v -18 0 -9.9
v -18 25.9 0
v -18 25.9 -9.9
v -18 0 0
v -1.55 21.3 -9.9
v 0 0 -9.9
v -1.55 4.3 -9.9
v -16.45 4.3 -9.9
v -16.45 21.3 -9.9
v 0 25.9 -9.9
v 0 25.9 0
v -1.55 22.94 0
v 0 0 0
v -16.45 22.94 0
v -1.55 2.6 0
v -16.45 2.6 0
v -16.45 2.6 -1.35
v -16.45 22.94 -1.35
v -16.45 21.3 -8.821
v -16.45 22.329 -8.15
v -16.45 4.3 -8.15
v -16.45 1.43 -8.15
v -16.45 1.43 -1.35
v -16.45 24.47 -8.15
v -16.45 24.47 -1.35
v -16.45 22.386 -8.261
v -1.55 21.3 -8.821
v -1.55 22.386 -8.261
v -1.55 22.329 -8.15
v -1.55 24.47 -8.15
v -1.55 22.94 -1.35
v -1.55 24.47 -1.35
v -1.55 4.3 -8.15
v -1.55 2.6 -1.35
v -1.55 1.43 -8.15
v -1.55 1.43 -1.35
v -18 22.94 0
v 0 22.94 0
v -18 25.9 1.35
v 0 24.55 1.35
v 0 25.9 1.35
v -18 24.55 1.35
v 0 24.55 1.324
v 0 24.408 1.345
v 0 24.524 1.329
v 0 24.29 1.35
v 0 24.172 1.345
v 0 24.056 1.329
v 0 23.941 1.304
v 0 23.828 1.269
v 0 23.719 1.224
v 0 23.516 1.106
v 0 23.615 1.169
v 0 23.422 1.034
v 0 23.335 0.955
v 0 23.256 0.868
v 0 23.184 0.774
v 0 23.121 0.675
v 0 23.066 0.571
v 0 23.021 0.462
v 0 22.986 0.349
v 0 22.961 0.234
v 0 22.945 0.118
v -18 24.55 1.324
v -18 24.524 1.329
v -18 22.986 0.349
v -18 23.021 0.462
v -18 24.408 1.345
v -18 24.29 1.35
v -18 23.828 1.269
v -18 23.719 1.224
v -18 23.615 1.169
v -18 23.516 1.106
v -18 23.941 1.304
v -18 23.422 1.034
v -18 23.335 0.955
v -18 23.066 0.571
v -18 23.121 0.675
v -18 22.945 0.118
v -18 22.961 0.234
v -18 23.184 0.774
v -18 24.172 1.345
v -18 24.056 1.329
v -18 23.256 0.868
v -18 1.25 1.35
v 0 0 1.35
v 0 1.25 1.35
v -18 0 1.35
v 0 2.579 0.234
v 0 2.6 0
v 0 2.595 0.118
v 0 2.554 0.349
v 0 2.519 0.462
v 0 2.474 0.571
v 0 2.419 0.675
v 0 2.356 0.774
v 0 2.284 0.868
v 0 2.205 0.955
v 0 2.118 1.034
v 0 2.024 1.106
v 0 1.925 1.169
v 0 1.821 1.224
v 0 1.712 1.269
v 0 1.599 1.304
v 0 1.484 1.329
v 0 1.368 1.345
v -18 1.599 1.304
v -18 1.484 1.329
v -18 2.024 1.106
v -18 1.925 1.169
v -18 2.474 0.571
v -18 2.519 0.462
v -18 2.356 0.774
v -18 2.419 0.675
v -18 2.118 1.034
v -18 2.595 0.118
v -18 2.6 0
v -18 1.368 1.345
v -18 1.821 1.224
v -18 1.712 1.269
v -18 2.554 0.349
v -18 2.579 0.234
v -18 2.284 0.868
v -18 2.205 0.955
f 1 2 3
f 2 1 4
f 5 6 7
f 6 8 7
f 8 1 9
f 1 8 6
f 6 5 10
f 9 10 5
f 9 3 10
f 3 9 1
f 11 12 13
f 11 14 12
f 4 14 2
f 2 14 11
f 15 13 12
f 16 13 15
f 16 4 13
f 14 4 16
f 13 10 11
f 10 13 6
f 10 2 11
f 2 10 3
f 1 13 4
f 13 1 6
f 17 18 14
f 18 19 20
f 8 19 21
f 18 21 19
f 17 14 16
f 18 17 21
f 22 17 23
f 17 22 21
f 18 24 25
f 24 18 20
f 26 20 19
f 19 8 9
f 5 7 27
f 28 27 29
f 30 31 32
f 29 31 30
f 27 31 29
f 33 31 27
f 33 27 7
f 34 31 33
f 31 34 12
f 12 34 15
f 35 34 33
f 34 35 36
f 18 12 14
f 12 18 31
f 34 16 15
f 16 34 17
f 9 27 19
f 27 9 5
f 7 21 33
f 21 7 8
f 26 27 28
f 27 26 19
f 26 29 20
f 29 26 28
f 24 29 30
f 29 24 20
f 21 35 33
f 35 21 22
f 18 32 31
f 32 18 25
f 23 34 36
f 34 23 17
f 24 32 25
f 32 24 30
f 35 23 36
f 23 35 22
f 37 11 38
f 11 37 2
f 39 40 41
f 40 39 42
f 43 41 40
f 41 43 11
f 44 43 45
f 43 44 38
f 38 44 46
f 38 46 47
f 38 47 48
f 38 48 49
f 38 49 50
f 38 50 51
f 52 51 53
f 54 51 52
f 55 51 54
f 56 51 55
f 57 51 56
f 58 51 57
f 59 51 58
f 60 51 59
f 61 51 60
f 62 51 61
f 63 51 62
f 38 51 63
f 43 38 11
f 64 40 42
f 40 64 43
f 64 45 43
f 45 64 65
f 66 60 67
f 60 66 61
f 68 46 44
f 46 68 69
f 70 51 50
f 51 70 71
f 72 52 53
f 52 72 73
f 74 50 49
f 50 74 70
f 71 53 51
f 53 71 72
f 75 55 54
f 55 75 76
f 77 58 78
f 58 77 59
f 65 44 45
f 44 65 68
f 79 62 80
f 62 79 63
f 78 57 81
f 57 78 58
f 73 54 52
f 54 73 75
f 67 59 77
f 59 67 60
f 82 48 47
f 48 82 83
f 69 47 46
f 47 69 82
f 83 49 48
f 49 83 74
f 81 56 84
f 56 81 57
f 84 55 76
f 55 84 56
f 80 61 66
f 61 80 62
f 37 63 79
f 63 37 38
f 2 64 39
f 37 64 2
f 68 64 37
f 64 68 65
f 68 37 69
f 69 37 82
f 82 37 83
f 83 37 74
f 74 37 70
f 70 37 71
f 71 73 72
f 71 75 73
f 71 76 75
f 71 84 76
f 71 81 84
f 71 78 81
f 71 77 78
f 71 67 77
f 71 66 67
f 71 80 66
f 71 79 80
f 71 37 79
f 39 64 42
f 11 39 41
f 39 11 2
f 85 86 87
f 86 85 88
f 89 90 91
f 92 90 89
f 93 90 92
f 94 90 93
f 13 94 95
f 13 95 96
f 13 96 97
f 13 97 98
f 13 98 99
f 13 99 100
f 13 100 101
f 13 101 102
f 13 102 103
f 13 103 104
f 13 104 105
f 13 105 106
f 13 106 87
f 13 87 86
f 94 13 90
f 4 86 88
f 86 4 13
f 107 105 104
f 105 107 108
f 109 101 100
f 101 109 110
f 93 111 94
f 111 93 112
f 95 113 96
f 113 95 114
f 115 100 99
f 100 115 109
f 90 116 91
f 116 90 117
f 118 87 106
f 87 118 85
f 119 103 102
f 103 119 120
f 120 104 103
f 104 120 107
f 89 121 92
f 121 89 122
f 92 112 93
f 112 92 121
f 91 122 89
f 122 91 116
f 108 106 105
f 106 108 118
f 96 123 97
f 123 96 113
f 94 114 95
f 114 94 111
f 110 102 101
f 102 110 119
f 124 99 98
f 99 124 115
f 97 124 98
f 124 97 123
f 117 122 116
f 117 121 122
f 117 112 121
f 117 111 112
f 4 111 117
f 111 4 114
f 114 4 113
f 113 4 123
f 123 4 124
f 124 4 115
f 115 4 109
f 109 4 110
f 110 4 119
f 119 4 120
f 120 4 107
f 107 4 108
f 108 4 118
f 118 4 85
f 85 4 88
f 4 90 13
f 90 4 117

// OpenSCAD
$fa = 5;
$fs = 0.01;

/*
 * The RJ45 keystone receiver
 */
// adjustments to original
clip_adjustment =0.9;   // some keystone jacks fit too tight so we add a little here
exterior_slot_adjustment = 3.4; // original 2.6
// the following have not been changed
outside_width=18;
outside_height=25 + clip_adjustment;
outside_depth=9.9;
outside_wall = 1.55;
inside_width = outside_width-(outside_wall*2);
inside_height= outside_height-5.56; //19.44;
inside_cutout_height = outside_height - 2.86;
inside_cutout_depth = outside_depth - 3.1;
exterior_slot = 7.9;
exterior_notch_height = 17.0;
exterior_notch_depth = outside_depth - 2.7;
exterior_slot_height = outside_height - 8.75;
top_clip_bar = outside_height - 2.96 ;

module rj45Receiver() 
{
	difference() 
    {
		cube([outside_width, outside_height, outside_depth]);
       
		translate([outside_wall, 2.6, 0]) {
			cube([inside_width, inside_height, exterior_slot]);
		}
        // exterior slot
		translate([outside_wall, exterior_slot_adjustment+clip_adjustment,
                exterior_slot]) 
        {
			cube([inside_width, exterior_notch_height, 2]);
		}
        // exterior_notch
    
        /*echo("exterior_notch_height", exterior_notch_height);
        echo("exterior_notch_depth", exterior_notch_depth);
        echo("exterior_notch_depth", exterior_notch_depth);
        */
		translate([outside_wall, exterior_notch_height+clip_adjustment,
                exterior_notch_depth]) 
        {
			rotate(v=[1, 0, 0], a=-27.3) 
            {
				cube([inside_width, 3.5, 3]);
			}
		}
        // interior cutout
		translate([outside_wall, 1.43, 1.35]) {
			cube([inside_width, inside_cutout_height, inside_cutout_depth]);
		}
	}
    // top clip bar
	translate([0, top_clip_bar, -1.35]) {
		intersection() {
			cube([outside_width, 2.96, 1.35]);
			union() {
				translate([0, 1.61, 0]) {
					cube([20.42, 1.61, 1.35]);
				}
				translate([0, 1.35, 1.35]) {
					rotate(v=[0, 1, 0], a=90) {
						cylinder(h=20.42, r=1.35);
					}
				}
			}
		}
	}
    // bottom clip bar
	translate([0, 0, -1.35]) {
		intersection() {
			cube([outside_width, outside_wall*2, 1.35]);
			union() {
				cube([20.42, 1.25, 1.35]);
				translate([0, 1.25, 1.35]) {
					rotate(v=[0, 1, 0], a=90) {
						cylinder(h=20.42, r=1.35);
					}
				}
			}
		}
	}
}

/*
 * So a hole can be cut for the keystone socket
 */
function rj45_width() = outside_width;
function rj45_height() = outside_height;
function rj45_depth() = outside_depth;

module rj45VolumeBlock() {
	cube([outside_width, outside_height, outside_depth]);
}

rotate([0,180,0]) 
    rj45Receiver();
